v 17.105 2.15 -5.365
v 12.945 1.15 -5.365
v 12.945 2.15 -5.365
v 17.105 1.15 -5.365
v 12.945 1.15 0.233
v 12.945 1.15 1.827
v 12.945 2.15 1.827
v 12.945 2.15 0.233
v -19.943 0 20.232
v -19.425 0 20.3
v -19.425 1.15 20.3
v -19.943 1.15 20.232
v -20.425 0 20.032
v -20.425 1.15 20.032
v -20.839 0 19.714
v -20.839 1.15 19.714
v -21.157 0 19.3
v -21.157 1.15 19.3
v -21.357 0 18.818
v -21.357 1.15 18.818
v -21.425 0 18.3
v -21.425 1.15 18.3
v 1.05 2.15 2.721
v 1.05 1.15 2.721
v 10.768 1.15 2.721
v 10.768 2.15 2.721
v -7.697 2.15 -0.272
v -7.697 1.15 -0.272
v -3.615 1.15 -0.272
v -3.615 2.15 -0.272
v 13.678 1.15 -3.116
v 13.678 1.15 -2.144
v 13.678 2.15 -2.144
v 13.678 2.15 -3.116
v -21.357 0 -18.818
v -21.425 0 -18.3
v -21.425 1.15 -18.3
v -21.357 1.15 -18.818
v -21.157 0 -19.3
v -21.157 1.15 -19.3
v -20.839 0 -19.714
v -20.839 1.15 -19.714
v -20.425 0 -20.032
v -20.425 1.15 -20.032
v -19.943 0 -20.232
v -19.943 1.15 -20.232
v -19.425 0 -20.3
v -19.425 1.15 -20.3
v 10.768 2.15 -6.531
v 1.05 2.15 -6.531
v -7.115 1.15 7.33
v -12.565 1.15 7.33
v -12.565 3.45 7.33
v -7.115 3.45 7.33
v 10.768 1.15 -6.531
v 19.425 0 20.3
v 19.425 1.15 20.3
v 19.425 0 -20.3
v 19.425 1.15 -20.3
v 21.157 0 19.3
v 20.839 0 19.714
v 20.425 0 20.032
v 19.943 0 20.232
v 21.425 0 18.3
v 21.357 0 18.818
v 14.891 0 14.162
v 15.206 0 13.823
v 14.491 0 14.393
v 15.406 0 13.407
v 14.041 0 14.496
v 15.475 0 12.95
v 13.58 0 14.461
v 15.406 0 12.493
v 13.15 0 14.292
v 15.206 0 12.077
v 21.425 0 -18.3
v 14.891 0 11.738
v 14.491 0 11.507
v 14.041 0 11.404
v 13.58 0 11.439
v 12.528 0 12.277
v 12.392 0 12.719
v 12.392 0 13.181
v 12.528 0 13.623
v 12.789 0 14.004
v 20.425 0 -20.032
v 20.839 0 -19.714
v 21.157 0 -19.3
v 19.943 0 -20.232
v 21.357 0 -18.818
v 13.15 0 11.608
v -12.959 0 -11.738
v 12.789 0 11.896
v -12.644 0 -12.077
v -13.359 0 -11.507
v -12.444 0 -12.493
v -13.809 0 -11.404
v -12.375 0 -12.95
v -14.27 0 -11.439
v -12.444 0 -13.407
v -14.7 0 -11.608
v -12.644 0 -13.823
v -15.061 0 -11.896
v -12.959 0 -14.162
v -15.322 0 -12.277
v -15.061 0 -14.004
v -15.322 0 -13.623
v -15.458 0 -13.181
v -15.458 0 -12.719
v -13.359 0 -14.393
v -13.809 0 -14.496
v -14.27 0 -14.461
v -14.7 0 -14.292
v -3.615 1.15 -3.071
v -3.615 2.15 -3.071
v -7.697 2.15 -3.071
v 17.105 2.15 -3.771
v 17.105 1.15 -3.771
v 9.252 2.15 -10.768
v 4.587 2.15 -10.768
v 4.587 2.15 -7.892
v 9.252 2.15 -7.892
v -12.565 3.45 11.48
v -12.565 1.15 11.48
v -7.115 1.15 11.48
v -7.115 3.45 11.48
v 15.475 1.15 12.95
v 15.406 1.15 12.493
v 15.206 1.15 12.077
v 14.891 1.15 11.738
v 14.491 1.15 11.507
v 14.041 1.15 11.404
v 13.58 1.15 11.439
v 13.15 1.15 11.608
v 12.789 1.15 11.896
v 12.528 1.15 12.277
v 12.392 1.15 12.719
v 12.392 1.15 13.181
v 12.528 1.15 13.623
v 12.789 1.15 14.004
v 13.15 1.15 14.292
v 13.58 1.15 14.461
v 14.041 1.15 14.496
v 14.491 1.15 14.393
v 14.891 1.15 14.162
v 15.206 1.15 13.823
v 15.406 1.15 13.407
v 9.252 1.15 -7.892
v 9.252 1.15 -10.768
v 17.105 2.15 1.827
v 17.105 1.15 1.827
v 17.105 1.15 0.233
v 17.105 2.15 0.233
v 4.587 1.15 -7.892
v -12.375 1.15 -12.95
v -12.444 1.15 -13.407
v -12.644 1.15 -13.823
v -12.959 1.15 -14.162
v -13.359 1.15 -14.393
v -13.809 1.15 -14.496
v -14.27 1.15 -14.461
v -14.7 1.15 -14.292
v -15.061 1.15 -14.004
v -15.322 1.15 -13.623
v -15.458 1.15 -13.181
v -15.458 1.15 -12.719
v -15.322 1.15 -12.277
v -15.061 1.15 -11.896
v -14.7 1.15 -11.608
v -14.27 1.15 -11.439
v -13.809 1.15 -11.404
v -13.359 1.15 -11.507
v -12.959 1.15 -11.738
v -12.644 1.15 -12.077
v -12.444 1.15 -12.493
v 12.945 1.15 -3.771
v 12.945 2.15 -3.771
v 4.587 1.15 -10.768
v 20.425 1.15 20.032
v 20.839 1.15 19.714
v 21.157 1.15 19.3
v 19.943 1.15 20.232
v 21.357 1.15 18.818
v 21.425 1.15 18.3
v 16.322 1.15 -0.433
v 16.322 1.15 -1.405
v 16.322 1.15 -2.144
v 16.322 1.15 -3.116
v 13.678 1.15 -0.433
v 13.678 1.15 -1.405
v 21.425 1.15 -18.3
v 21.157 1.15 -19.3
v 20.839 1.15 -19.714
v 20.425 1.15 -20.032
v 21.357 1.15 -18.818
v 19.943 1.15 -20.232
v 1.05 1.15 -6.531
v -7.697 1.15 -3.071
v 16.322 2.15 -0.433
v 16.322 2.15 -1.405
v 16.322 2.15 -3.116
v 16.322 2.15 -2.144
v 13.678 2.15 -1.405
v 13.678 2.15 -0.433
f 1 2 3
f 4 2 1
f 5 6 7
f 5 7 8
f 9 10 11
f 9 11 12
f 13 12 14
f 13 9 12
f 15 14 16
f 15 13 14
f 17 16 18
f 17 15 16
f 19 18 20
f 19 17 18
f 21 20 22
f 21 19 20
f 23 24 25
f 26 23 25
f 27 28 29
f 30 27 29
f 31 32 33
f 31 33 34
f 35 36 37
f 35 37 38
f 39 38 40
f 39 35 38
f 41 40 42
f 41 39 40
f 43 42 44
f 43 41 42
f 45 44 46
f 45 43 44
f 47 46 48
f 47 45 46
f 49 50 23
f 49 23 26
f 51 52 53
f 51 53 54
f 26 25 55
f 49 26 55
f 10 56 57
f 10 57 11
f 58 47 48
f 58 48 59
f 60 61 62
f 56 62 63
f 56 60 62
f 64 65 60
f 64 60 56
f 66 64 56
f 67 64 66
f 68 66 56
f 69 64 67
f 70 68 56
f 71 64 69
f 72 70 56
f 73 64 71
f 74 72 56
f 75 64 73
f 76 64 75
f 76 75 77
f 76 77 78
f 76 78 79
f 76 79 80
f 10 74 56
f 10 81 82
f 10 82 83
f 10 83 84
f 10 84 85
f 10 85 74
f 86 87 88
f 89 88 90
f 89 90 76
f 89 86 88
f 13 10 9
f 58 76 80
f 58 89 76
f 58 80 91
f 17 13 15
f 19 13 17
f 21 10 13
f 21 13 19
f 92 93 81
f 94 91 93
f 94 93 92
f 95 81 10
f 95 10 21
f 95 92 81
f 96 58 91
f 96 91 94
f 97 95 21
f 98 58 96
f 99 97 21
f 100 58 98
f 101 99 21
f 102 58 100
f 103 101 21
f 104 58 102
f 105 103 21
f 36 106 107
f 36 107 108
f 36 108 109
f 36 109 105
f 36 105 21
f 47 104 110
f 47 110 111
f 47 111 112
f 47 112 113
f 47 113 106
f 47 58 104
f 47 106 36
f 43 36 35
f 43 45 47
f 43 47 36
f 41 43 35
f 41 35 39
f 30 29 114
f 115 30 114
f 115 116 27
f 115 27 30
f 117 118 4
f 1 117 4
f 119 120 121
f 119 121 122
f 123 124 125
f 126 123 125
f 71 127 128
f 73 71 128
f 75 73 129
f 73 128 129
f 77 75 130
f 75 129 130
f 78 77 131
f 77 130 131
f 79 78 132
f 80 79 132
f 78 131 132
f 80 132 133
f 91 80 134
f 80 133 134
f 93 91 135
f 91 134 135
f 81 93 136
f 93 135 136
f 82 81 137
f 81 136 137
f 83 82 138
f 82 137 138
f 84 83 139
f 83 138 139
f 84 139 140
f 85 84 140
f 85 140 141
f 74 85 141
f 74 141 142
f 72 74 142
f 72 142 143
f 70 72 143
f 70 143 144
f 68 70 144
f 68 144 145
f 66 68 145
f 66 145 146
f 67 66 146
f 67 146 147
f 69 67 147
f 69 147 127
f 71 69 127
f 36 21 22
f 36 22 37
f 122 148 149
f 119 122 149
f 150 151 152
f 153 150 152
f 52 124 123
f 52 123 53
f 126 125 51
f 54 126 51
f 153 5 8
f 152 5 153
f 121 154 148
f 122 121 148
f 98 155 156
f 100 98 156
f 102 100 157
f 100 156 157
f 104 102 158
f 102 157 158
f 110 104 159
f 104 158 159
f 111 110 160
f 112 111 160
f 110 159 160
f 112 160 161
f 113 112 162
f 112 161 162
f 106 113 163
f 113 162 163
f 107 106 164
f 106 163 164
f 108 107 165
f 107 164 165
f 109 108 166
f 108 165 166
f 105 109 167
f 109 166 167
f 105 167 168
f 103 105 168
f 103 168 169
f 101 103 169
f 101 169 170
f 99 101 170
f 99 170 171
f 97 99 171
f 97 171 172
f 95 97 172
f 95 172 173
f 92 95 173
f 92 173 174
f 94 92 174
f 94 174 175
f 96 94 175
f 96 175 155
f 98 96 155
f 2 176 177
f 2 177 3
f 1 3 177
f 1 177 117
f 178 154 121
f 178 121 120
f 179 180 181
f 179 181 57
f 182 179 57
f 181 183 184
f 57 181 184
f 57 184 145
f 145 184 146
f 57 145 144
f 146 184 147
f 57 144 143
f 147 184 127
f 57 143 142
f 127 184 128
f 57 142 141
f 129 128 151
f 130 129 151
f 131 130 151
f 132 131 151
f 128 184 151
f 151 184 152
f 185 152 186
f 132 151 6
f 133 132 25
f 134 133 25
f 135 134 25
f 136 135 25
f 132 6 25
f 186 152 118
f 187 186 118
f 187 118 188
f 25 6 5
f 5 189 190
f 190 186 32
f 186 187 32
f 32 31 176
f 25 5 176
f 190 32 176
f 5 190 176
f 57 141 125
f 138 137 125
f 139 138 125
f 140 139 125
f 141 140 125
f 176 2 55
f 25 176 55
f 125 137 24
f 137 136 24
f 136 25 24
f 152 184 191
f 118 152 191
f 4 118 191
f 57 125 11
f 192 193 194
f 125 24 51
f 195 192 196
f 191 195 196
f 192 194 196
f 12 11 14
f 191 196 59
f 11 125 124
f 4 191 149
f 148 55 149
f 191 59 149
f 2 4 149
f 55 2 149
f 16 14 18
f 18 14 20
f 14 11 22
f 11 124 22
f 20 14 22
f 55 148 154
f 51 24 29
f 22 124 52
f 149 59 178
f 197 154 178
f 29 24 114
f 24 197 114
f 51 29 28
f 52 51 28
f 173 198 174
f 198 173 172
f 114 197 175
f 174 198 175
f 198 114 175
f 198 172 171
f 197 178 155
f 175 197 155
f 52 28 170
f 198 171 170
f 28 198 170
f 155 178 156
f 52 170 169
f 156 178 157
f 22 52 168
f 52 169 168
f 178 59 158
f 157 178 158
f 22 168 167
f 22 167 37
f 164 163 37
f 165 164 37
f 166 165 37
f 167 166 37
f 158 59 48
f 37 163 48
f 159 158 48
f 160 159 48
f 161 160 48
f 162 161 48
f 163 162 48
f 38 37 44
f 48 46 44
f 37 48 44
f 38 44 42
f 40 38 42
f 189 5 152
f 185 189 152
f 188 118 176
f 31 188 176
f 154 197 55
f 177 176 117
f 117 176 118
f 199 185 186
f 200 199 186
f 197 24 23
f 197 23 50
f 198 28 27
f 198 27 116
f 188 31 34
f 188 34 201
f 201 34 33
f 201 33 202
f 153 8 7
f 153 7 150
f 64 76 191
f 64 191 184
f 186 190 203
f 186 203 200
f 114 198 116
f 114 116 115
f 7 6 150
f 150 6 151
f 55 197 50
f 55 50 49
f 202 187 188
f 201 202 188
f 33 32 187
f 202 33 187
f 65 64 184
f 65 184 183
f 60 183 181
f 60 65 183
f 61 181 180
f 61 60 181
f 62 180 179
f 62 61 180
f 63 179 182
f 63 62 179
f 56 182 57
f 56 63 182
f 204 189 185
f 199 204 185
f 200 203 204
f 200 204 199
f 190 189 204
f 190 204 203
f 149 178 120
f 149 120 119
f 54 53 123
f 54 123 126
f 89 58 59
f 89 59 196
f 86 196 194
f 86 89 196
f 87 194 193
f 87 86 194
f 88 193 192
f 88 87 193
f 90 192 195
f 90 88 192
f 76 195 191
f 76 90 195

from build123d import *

# Parameters (mm, degrees)
BOSS_EXTRUDE1_DEPTH = 1.15
CUT_EXTRUDE1_REACH  = 3.15
SKETCH2_R           = 1.55
SKETCH3_W           = 5.45
SKETCH3_H           = 4.15
BOSS_EXTRUDE2_DEPTH = 2.3
SKETCH4_W           = 9.718661505
SKETCH4_H           = 9.252165754
SKETCH4_W_2         = 4.664957522
SKETCH4_H_2         = 2.876723805
SKETCH4_W_3         = 4.081837833
SKETCH4_H_3         = 2.798974514
SKETCH4_W_4         = 4.159587124
SKETCH4_H_4         = 1.593860487
SKETCH4_W_5         = 2.64347593
SKETCH4_H_5         = 0.971866151
BOSS_EXTRUDE3_DEPTH = 1


with BuildPart() as part:
    # Sketch1 → Boss-Extrude1 (new body)
    with BuildSketch(Plane(origin=(0, 0, 0), x_dir=(1, 0, 0), z_dir=(0, 1, 0))):
        with BuildLine():
            Line((-19.425, 20.3), (19.425, 20.3))
            ThreePointArc((19.425, 20.3), (20.839213562, 19.714213562), (21.425, 18.3))
            Line((21.425, 18.3), (21.425, -18.3))
            ThreePointArc((21.425, -18.3), (20.839213562, -19.714213562), (19.425, -20.3))
            Line((19.425, -20.3), (-19.425, -20.3))
            ThreePointArc((-19.425, -20.3), (-20.839213562, -19.714213562), (-21.425, -18.3))
            Line((-21.425, -18.3), (-21.425, 18.3))
            ThreePointArc((-21.425, 18.3), (-20.839213562, 19.714213562), (-19.425, 20.3))
        make_face()
    extrude(amount=BOSS_EXTRUDE1_DEPTH)

    # Sketch2 → Cut-Extrude1 (cut, up to next)
    with BuildSketch(Plane(origin=(0, 1.15, 0), x_dir=(1, 0, 0), z_dir=(0, 1, 0)), mode=Mode.PRIVATE) as cut_extrude1_sk1:
        with Locations((-13.925, 12.95)):
            Circle(SKETCH2_R)
    cut_extrude1_tool1 = extrude(cut_extrude1_sk1.sketch, amount=-CUT_EXTRUDE1_REACH, mode=Mode.PRIVATE) & part.part
    add(cut_extrude1_tool1.solids().sort_by_distance((-13.925, 1.15, -12.95))[0], mode=Mode.SUBTRACT)
    # Sketch2 → Cut-Extrude1 (cut, up to next)
    with BuildSketch(Plane(origin=(0, 1.15, 0), x_dir=(1, 0, 0), z_dir=(0, 1, 0)), mode=Mode.PRIVATE) as cut_extrude1_sk2:
        with Locations((13.925, -12.95)):
            Circle(SKETCH2_R)
    cut_extrude1_tool2 = extrude(cut_extrude1_sk2.sketch, amount=-CUT_EXTRUDE1_REACH, mode=Mode.PRIVATE) & part.part
    add(cut_extrude1_tool2.solids().sort_by_distance((13.925, 1.15, 12.95))[0], mode=Mode.SUBTRACT)

    # Sketch3 → Boss-Extrude2 (add)
    with BuildSketch(Plane(origin=(0, 1.15, 0), x_dir=(1, 0, 0), z_dir=(0, 1, 0))):
        with Locations((-9.84, -9.405)):
            Rectangle(SKETCH3_W, SKETCH3_H)
    extrude(amount=BOSS_EXTRUDE2_DEPTH)

    # Sketch4 → Boss-Extrude3 (add)
    with BuildSketch(Plane(origin=(0, 1.15, 0), x_dir=(1, 0, 0), z_dir=(0, 1, 0))):
        with Locations((5.908946196, 1.904857655)):
            Rectangle(SKETCH4_W, SKETCH4_H)
        with Locations((6.919686992, 9.329915045)):
            Rectangle(SKETCH4_W_2, SKETCH4_H_2)
        with Locations((-5.656260997, 1.671609779)):
            Rectangle(SKETCH4_W_3, SKETCH4_H_3)
        with Locations((15.025050688, 4.567770907)):
            Rectangle(SKETCH4_W_4, SKETCH4_H_4)
        with Locations((14.99993444, 2.629590434)):
            Rectangle(SKETCH4_W_5, SKETCH4_H_5)
        with Locations((14.99993444, 0.91910601)):
            Rectangle(SKETCH4_W_5, SKETCH4_H_5)
        with Locations((15.025050688, -1.030178119)):
            Rectangle(SKETCH4_W_4, SKETCH4_H_4)
    extrude(amount=BOSS_EXTRUDE3_DEPTH)


solid = part.part
